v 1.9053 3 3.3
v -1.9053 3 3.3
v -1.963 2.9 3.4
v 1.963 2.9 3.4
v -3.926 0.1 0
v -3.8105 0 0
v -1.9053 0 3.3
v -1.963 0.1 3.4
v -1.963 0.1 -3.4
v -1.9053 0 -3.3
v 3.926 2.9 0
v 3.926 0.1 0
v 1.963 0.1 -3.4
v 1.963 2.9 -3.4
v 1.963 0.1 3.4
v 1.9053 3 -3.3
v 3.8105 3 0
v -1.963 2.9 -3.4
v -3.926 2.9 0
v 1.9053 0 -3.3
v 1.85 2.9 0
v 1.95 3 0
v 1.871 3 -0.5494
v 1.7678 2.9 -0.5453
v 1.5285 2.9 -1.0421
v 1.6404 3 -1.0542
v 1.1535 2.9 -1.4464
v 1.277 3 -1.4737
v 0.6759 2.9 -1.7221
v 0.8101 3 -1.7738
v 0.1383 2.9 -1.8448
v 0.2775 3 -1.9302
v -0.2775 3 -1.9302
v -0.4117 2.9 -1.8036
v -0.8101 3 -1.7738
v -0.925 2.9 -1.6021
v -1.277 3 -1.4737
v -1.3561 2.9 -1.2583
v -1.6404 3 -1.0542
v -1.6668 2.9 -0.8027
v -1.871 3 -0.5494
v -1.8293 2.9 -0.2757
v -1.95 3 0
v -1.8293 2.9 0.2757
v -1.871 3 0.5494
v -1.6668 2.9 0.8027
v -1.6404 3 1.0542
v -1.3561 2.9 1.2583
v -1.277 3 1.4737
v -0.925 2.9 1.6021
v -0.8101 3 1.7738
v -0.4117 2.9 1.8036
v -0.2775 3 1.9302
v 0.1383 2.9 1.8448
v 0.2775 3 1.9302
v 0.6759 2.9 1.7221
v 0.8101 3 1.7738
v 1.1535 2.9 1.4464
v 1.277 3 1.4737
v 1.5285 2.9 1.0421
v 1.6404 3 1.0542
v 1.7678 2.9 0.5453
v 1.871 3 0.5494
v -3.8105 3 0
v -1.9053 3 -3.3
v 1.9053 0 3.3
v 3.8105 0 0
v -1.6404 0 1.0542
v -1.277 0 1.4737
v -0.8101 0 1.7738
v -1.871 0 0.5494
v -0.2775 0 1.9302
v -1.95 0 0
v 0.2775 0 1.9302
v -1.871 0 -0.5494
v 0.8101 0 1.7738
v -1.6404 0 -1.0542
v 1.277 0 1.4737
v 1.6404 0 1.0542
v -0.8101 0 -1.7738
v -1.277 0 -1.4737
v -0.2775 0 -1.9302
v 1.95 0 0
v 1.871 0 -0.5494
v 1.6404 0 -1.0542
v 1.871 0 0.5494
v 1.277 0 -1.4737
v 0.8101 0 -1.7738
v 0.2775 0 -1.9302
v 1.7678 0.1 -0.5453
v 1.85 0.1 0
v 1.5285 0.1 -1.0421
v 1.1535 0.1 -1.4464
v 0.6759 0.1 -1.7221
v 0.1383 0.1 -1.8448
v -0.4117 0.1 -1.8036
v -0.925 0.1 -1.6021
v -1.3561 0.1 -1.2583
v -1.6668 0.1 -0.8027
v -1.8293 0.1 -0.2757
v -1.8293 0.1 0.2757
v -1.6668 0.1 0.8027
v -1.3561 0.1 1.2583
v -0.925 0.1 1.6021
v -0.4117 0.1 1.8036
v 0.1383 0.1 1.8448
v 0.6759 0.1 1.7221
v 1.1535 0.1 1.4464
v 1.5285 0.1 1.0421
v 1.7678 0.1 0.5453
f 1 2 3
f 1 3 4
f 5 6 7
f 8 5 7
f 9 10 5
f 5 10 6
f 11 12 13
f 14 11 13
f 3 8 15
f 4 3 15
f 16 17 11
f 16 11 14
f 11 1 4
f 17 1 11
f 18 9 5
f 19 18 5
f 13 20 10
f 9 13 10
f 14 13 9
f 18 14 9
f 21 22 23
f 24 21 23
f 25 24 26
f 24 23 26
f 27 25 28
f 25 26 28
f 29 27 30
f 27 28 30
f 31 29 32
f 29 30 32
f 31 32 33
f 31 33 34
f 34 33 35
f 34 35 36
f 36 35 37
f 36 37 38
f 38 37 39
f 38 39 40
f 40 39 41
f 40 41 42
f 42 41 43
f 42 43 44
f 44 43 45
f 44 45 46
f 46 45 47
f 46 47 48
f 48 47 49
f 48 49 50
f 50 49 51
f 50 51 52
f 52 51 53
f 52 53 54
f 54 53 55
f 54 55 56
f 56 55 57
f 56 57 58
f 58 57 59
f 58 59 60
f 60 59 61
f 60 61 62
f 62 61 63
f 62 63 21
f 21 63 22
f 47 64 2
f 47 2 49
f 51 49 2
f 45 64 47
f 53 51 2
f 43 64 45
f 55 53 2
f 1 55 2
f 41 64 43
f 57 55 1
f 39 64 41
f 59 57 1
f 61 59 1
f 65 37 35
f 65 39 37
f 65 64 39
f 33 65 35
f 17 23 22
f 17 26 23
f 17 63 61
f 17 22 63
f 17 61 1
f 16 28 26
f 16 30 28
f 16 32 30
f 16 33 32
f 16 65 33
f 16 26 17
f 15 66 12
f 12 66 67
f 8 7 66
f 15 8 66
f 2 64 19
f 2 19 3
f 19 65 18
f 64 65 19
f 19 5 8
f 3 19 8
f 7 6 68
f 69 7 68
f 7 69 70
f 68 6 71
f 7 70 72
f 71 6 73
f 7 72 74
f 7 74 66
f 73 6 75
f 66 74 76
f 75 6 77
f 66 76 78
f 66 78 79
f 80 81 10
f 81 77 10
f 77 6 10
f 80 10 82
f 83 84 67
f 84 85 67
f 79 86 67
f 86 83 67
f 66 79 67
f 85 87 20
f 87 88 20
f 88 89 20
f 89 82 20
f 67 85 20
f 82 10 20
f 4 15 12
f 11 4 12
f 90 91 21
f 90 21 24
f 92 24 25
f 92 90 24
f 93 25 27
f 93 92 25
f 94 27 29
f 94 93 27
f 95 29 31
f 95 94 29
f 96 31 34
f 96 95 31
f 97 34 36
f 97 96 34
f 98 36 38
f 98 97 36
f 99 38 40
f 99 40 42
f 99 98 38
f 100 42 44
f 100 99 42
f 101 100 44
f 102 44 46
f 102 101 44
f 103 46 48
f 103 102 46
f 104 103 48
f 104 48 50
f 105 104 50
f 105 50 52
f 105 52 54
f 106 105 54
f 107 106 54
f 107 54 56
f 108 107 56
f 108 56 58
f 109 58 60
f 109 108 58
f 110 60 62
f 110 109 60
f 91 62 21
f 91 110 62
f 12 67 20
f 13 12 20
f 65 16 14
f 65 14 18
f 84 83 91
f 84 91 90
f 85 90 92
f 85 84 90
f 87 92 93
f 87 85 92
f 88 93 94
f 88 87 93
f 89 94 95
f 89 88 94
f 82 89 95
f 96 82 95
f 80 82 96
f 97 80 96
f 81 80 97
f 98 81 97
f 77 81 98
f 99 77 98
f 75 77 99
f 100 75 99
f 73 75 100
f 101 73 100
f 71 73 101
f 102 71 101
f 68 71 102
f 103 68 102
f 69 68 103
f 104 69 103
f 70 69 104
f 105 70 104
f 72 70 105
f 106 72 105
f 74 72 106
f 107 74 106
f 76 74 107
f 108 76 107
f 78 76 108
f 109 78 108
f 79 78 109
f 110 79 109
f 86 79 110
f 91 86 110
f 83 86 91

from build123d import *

# Parameters (mm, degrees)
SKETCH_1_R      = 1.85
EXTRUDE_1_DEPTH = 3
CHAMFER_1_SIZE  = 0.1


with BuildPart() as part:
    # Эскиз1 → Бобышка-Вытянуть1 (new body)
    with BuildSketch(Plane(origin=(0, 0, 0), x_dir=(1, 0, 0), z_dir=(0, 1, 0))):
        Polygon((3.92598183, 0), (1.962990915, 3.4), (-1.962990915, 3.4), (-3.92598183, 0), (-1.962990915, -3.4), (1.962990915, -3.4), align=None)
        Circle(SKETCH_1_R, mode=Mode.SUBTRACT)
    extrude(amount=EXTRUDE_1_DEPTH)

    # Фаска1
    chamfer_1_edges = [part.edges().sort_by_distance(p)[0] for p in [
        (0, 3, -3.4),
        (-2.944486373, 3, -1.7),
        (-2.944486373, 3, 1.7),
        (-1.85, 0, 0),
        (-1.85, 3, 0),
        (0, 3, 3.4),
        (2.944486373, 3, 1.7),
        (0, 0, 3.4),
        (-2.944486373, 0, 1.7),
        (-2.944486373, 0, -1.7),
        (2.944486373, 3, -1.7),
        (0, 0, -3.4),
        (2.944486373, 0, -1.7),
        (2.944486373, 0, 1.7),
    ]]
    chamfer(chamfer_1_edges, length=CHAMFER_1_SIZE)


solid = part.part
